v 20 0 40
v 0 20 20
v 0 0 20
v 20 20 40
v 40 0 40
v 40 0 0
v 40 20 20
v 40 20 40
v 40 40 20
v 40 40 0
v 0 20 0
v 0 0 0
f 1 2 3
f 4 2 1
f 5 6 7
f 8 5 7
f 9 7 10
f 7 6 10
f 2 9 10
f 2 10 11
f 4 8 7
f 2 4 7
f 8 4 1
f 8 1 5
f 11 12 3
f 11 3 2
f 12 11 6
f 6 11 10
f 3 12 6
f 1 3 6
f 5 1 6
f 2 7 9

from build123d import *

# Parameters (mm, degrees)
SKETCH1_W           = 40
SKETCH1_H           = 40
BOSS_EXTRUDE1_DEPTH = 40
CUT_EXTRUDE1_DEPTH  = 40
SKETCH3_W           = 20
SKETCH3_H           = 20
CUT_EXTRUDE2_DEPTH  = 40
CUT_EXTRUDE3_DEPTH  = 40


with BuildPart() as part:
    # Sketch1 → Boss-Extrude1 (new body)
    with BuildSketch(Plane.XY):
        with Locations((20, 20)):
            Rectangle(SKETCH1_W, SKETCH1_H)
    extrude(amount=BOSS_EXTRUDE1_DEPTH)

    # Sketch2 → Cut-Extrude1 (cut)
    with BuildSketch(Plane.XY.offset(40)):
        Polygon((40, 40), (0, 20), (0, 40), align=None)
    extrude(amount=-CUT_EXTRUDE1_DEPTH, mode=Mode.SUBTRACT)

    # Sketch3 → Cut-Extrude2 (cut)
    with BuildSketch(Plane(origin=(40, 0, 0), x_dir=(0, 0, -1), z_dir=(1, 0, 0))):
        with Locations((-30, 30)):
            Rectangle(SKETCH3_W, SKETCH3_H)
    extrude(amount=-CUT_EXTRUDE2_DEPTH, mode=Mode.SUBTRACT)

    # Sketch4 → Cut-Extrude3 (cut)
    with BuildSketch(Plane(origin=(0, 20, 0), x_dir=(1, 0, 0), z_dir=(0, 1, 0))):
        Polygon((0, -20), (20, -40), (0, -40), align=None)
    extrude(amount=-CUT_EXTRUDE3_DEPTH, mode=Mode.SUBTRACT)


solid = part.part
